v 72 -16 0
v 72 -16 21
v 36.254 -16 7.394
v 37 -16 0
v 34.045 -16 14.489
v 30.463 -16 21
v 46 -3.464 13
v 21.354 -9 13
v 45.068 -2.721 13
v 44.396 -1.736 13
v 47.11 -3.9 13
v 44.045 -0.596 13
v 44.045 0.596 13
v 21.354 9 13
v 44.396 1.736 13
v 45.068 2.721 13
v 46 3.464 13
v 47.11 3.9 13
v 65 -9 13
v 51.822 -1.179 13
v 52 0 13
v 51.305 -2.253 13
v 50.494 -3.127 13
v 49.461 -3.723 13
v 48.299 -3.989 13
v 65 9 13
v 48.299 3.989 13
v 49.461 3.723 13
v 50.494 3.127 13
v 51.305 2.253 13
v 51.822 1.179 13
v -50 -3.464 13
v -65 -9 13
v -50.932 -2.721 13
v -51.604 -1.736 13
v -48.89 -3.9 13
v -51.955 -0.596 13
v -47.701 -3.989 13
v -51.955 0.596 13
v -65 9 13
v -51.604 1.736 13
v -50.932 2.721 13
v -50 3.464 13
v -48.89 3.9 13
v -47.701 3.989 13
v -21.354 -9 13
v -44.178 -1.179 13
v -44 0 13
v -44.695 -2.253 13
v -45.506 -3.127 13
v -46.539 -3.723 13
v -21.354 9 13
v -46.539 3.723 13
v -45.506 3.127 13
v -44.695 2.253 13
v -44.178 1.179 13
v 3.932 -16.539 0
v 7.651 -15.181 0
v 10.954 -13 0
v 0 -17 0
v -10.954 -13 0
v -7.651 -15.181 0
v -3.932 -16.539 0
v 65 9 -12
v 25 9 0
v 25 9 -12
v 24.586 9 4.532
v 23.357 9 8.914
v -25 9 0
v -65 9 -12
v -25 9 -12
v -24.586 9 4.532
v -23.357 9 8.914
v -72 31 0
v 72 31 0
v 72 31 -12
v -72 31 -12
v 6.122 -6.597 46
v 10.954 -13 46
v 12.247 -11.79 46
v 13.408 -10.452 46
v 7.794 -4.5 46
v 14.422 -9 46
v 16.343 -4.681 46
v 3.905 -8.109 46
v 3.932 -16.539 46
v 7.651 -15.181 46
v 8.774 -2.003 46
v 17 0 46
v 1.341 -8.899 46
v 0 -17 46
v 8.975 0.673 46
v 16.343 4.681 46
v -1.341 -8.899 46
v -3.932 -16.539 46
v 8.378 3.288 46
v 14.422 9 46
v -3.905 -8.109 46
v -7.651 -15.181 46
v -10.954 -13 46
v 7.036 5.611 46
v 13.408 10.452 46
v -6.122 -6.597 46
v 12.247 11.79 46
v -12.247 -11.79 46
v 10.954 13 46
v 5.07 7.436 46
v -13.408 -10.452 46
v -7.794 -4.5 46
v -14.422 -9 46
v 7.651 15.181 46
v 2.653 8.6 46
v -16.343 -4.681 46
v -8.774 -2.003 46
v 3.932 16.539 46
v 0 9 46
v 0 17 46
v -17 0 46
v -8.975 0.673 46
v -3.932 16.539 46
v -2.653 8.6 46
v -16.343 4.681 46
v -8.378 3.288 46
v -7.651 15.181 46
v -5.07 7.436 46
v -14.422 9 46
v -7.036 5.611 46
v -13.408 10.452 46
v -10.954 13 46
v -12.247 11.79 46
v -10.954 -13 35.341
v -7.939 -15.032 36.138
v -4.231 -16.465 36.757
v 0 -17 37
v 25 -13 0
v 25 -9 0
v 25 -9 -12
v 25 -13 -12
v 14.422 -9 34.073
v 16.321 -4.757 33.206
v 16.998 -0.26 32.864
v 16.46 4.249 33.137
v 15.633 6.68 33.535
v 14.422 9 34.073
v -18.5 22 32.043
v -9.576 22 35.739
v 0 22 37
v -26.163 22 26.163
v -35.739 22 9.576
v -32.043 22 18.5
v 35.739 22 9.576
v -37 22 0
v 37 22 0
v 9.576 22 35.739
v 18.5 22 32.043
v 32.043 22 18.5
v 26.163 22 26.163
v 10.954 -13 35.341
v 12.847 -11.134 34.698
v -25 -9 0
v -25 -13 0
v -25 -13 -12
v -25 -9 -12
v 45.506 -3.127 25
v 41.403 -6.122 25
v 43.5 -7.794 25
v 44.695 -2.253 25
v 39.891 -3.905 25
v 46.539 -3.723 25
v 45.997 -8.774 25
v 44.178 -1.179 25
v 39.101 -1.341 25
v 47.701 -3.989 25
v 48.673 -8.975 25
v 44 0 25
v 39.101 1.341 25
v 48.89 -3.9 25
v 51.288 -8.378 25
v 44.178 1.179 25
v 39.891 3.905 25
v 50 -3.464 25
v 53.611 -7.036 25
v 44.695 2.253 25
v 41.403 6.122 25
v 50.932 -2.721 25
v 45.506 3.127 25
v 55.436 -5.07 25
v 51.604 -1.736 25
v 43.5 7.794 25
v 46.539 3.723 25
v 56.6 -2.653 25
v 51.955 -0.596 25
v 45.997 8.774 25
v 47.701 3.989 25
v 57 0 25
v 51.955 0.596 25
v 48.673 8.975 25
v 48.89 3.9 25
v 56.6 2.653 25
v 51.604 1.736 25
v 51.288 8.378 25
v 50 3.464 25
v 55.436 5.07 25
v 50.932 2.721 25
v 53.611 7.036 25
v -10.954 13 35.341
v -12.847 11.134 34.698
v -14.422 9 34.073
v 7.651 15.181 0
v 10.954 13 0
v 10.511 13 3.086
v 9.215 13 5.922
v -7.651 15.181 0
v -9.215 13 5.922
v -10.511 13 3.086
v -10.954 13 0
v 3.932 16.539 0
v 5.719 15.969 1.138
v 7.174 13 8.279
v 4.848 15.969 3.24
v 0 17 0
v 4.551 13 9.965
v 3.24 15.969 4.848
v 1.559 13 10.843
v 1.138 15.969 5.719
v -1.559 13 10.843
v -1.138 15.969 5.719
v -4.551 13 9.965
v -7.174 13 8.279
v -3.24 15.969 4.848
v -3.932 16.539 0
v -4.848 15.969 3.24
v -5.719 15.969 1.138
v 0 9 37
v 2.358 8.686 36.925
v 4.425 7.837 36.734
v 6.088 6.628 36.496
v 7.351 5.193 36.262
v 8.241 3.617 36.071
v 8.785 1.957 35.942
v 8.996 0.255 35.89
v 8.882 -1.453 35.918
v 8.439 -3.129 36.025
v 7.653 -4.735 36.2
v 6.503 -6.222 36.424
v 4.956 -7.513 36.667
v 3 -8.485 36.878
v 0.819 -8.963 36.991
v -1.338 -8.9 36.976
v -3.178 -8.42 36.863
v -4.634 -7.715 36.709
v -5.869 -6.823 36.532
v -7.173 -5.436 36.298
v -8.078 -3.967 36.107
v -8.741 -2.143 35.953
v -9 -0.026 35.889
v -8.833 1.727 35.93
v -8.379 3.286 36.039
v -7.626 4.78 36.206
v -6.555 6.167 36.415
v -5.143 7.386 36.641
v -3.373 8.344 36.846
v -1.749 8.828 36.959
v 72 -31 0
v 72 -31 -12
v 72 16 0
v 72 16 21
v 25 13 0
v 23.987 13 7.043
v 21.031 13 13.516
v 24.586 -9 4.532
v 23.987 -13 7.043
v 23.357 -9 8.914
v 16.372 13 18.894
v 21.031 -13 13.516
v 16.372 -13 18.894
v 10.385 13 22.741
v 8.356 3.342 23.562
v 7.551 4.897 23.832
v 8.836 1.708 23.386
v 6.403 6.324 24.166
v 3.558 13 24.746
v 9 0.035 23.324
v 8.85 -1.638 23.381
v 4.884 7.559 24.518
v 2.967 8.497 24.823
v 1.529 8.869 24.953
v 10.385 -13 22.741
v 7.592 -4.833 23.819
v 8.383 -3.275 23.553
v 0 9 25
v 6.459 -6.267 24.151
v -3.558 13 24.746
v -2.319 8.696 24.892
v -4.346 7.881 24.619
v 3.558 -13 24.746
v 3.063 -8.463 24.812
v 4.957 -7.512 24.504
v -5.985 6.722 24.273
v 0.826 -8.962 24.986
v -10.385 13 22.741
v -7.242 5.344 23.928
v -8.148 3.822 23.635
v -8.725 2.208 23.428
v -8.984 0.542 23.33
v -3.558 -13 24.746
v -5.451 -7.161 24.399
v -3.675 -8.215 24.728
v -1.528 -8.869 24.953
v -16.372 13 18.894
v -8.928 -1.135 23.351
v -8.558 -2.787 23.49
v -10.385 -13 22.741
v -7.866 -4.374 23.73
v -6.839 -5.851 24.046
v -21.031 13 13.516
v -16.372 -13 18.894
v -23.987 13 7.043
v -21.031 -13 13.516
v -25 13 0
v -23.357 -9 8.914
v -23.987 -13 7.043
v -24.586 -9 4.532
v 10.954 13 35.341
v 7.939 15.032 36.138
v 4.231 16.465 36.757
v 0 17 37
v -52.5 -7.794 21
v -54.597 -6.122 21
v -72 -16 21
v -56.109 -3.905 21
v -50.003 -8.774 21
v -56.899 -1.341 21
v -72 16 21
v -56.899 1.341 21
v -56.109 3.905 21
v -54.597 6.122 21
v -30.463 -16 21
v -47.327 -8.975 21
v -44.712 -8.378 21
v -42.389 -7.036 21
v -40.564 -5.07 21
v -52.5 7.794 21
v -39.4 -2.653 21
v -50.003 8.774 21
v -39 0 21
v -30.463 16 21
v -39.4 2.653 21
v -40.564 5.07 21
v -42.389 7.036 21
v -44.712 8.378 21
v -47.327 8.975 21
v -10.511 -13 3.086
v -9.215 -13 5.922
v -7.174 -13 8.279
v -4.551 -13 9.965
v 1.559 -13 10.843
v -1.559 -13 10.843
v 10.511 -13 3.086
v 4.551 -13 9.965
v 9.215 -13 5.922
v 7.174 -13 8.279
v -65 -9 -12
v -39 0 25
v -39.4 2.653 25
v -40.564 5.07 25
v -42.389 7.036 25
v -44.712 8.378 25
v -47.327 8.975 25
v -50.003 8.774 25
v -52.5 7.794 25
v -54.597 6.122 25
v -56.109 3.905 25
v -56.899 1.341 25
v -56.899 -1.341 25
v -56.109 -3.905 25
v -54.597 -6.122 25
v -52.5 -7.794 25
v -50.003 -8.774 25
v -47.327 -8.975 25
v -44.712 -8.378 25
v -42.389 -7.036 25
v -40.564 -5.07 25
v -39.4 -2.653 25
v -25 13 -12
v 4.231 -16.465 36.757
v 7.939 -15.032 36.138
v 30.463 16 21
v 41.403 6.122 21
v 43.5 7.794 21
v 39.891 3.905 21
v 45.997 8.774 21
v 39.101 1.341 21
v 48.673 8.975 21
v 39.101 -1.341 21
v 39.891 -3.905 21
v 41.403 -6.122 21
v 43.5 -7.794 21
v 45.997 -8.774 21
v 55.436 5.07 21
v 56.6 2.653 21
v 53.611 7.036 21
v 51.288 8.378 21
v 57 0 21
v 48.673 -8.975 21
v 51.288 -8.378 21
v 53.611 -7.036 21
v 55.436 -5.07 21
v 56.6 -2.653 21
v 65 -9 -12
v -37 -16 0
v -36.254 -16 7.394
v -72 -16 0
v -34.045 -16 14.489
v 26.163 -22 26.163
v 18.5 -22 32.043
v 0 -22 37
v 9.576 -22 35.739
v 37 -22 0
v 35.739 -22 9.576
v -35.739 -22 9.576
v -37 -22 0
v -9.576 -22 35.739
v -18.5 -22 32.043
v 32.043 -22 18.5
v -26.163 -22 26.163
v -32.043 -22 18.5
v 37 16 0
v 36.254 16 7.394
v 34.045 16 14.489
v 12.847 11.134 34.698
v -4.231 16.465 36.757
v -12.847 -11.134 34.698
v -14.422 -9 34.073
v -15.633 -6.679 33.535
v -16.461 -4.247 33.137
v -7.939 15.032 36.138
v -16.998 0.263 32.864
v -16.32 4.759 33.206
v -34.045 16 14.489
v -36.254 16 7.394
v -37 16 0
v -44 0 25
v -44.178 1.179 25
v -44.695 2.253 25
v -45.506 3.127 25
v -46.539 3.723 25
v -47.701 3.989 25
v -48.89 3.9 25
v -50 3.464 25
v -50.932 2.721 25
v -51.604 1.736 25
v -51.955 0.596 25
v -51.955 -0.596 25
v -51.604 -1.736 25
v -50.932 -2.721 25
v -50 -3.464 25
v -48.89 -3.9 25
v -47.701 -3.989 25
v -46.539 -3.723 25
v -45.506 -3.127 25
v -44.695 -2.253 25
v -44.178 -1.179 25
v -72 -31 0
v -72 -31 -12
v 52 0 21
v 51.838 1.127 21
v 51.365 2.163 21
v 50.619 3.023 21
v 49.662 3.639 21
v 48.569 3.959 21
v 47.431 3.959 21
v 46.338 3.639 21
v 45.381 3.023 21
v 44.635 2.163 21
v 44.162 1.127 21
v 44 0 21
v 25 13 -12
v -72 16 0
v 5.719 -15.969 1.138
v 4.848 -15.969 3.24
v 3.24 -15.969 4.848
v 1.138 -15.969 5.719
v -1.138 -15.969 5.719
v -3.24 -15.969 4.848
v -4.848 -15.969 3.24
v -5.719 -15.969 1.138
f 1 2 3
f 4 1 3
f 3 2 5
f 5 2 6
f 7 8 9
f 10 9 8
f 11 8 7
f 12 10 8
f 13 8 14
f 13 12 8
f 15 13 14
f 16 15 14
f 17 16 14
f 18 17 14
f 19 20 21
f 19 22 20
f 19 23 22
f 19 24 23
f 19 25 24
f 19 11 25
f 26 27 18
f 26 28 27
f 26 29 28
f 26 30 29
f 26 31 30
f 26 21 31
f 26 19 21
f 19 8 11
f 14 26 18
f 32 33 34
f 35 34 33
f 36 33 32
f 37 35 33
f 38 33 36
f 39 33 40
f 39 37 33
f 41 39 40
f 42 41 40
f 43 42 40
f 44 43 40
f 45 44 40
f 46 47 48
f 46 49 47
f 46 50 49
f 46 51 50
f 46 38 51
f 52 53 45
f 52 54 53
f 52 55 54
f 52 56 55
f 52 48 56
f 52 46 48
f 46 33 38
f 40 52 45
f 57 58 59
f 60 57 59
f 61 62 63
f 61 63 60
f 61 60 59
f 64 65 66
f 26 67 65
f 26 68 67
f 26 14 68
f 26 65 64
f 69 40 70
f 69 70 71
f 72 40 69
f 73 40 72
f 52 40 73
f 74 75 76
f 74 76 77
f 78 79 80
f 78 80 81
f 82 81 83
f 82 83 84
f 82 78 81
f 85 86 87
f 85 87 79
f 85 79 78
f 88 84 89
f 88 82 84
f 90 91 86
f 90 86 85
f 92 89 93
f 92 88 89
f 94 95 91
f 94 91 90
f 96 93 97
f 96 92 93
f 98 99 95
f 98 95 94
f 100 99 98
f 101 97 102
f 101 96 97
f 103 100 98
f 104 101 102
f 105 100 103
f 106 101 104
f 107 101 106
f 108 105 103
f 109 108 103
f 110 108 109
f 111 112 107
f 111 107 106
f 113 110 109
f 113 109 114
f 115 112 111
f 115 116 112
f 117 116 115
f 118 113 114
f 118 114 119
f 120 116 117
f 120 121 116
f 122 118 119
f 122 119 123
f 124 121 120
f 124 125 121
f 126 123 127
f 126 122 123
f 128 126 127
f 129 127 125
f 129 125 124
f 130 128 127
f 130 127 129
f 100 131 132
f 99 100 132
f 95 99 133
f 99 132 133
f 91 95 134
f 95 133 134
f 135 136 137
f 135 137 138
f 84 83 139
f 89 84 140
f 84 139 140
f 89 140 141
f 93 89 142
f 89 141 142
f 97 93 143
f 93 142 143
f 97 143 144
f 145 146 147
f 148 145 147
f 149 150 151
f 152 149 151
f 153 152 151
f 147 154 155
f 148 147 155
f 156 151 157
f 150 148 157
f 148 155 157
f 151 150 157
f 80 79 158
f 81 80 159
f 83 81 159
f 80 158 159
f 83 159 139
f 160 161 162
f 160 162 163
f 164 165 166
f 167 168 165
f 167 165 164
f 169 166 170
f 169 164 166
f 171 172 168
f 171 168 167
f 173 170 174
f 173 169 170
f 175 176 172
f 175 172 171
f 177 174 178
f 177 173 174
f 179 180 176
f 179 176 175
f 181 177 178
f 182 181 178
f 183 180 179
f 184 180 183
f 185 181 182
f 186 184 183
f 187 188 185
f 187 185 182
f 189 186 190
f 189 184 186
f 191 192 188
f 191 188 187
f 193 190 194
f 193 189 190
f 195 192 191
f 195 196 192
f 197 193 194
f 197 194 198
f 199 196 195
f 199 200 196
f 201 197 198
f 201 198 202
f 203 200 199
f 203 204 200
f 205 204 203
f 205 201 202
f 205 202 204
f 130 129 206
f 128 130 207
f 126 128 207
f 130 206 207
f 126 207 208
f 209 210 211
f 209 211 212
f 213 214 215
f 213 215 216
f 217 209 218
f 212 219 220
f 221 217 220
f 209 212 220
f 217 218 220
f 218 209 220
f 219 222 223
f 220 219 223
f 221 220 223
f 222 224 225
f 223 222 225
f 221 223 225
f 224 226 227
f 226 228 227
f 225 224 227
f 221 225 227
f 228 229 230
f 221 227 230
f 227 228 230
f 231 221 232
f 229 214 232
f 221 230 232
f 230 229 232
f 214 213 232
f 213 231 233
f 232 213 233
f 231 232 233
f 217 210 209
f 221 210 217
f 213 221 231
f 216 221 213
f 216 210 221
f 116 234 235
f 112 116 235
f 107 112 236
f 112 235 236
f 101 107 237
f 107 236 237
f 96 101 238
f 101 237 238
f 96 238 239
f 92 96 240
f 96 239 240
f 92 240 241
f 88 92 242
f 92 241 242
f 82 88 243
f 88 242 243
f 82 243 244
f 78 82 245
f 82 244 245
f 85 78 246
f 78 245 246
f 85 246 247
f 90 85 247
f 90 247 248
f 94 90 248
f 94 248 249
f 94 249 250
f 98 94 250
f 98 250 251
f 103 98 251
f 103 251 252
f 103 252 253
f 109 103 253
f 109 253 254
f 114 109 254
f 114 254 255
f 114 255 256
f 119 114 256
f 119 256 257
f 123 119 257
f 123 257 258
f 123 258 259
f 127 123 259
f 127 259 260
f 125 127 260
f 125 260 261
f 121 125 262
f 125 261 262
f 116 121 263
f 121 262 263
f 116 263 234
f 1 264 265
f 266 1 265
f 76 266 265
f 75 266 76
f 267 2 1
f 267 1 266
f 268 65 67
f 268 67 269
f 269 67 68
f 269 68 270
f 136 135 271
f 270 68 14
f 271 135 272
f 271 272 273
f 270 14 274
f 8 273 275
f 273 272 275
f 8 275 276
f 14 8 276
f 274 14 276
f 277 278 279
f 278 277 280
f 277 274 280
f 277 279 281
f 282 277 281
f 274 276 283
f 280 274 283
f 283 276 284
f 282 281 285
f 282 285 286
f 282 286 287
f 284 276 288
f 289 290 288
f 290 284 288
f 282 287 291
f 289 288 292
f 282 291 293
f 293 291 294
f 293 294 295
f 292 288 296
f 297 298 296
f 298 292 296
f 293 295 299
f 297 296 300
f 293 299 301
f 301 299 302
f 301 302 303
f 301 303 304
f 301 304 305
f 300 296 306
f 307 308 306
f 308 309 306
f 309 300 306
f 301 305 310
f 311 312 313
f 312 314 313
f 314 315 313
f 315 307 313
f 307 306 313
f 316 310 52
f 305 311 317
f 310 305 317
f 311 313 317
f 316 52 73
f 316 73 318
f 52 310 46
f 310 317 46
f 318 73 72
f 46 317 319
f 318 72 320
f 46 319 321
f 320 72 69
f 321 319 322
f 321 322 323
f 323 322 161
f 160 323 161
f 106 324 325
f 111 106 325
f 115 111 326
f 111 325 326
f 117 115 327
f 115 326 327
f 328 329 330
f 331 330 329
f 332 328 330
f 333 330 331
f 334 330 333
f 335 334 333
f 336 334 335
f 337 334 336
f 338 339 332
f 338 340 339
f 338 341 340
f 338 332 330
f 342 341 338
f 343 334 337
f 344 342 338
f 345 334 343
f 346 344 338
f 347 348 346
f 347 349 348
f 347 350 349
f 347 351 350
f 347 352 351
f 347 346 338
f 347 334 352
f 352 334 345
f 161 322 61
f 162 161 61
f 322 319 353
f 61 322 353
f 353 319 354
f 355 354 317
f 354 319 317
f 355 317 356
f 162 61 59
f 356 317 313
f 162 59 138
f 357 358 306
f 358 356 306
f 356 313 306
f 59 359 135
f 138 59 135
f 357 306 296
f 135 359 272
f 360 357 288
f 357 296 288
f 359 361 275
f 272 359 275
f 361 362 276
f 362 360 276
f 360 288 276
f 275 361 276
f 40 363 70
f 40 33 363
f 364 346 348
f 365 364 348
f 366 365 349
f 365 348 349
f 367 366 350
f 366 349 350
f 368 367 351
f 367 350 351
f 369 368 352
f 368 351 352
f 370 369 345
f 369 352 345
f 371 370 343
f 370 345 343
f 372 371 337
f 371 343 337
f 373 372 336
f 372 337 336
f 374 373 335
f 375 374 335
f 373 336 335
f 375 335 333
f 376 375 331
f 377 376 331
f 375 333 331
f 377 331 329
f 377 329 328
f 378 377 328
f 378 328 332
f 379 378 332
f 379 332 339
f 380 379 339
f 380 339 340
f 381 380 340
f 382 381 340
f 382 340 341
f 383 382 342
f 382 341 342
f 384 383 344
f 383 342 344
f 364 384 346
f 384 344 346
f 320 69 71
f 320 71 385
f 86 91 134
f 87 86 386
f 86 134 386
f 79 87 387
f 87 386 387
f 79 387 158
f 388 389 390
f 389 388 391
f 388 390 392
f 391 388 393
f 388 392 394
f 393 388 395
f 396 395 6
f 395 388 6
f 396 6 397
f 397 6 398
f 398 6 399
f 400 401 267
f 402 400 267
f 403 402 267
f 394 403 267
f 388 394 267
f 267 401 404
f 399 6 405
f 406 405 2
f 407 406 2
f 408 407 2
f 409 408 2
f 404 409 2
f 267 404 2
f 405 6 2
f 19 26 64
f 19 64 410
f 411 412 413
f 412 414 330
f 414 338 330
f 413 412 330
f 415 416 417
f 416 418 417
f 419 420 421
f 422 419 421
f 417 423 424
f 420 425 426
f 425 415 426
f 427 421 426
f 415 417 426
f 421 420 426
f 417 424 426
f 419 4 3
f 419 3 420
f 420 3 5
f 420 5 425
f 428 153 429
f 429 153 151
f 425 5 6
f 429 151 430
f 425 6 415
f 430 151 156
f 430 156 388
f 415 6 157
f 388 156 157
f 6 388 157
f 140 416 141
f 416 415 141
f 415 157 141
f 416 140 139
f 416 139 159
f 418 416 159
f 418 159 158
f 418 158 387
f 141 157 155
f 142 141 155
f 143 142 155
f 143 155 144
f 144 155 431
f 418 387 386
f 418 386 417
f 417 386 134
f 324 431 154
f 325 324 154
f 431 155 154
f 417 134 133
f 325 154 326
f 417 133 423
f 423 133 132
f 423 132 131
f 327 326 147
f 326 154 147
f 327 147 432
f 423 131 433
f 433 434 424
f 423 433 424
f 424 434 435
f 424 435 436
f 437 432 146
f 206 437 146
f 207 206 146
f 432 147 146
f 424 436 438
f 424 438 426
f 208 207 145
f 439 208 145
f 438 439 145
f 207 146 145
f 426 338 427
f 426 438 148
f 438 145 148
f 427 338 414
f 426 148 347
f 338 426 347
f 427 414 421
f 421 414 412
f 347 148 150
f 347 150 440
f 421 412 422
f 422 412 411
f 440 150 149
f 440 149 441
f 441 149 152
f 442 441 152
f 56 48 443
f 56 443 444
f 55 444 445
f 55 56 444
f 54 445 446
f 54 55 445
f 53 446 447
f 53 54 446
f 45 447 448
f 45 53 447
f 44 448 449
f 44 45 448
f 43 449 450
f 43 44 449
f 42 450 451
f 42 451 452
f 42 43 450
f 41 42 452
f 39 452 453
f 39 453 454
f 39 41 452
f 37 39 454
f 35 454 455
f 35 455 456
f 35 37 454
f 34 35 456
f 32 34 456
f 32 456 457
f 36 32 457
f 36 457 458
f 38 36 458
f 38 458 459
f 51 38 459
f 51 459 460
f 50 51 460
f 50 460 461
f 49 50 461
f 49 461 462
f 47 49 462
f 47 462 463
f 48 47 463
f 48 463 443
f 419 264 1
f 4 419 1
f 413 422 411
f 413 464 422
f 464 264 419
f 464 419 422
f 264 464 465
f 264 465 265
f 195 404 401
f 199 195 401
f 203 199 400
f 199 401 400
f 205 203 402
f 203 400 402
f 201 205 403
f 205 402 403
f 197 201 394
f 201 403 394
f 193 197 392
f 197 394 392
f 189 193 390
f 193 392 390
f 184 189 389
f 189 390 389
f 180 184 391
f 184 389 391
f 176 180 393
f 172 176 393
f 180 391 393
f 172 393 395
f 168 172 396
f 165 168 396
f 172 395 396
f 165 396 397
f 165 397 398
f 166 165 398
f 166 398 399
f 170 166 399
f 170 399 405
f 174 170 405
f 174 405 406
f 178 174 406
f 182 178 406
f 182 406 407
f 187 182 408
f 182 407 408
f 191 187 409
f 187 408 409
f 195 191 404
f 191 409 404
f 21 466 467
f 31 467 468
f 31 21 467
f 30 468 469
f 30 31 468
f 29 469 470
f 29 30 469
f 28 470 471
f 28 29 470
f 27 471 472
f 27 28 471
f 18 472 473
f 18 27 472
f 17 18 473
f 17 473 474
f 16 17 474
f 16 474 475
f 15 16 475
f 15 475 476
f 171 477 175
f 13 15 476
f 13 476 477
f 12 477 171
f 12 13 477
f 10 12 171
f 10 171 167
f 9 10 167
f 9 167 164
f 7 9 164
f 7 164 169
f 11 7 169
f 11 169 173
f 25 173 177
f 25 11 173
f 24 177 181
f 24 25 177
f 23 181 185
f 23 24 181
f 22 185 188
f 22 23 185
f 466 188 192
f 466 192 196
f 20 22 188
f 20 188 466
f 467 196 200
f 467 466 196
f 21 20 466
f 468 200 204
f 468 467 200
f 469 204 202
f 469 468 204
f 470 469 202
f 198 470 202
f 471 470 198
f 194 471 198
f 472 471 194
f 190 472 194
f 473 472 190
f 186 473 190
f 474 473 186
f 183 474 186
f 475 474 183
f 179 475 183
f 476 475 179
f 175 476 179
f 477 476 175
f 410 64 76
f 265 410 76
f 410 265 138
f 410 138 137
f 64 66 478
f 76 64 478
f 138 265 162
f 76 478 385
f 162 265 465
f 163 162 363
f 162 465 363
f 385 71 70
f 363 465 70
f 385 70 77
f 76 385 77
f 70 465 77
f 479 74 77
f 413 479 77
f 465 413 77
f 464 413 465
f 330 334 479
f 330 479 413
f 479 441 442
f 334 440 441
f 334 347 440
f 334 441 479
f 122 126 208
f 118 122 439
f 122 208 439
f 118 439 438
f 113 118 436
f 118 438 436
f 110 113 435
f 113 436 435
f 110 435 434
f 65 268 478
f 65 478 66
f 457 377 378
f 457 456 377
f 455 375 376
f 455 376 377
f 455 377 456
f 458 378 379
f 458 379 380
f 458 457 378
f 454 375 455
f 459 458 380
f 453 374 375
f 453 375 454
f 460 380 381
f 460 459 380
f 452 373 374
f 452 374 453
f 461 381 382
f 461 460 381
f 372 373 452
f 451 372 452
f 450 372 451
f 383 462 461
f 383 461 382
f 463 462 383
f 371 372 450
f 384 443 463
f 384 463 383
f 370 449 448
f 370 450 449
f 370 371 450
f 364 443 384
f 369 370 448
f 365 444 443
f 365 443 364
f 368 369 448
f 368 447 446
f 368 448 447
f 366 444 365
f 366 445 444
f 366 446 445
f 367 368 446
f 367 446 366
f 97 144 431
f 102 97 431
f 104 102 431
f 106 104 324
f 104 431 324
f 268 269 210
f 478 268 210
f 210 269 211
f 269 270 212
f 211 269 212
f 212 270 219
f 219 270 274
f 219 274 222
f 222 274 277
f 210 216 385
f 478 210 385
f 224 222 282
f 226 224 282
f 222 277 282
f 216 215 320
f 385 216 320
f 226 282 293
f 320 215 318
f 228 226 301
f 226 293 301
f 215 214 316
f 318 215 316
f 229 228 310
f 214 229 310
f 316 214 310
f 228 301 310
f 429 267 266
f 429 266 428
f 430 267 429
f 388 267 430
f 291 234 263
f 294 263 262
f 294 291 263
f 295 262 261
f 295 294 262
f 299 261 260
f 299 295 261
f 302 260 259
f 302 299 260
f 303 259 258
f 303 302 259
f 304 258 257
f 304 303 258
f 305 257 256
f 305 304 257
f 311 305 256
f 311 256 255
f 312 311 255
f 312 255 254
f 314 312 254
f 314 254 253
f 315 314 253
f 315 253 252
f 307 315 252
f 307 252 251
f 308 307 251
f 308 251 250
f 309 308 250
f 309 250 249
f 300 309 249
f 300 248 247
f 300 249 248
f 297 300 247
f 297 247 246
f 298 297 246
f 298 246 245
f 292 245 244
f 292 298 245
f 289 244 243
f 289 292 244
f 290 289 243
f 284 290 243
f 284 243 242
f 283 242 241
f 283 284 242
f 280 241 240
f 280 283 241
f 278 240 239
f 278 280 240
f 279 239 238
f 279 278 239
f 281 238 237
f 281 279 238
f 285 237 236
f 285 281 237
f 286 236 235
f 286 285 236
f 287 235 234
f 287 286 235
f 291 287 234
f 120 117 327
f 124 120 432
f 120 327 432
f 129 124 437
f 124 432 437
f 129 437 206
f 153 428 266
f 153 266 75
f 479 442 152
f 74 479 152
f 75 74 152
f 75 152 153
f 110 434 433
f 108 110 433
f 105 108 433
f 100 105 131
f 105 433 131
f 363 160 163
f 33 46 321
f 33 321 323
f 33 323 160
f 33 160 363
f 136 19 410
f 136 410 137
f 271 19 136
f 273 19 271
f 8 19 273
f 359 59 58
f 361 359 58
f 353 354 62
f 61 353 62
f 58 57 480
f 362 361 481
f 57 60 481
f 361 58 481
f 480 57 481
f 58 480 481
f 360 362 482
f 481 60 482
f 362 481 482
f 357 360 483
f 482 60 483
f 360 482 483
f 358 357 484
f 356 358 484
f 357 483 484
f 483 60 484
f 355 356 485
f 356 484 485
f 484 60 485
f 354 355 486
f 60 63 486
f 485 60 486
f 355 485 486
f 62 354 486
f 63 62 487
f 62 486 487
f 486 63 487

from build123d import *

# Parameters (mm, degrees)
SKETCH1_W               = 62
SKETCH1_H               = 144
BOSS_EXTRUDE1_DEPTH     = 12
REVOLVE1_ANGLE          = 180
BOSS_EXTRUDE2_START     = 25
SKETCH1_4_R             = 17
SKETCH1_4_R_2           = 9
BOSS_EXTRUDE2_DEPTH     = 21
SKETCH2_W               = 41.536907577
SKETCH2_H               = 21
BOSS_EXTRUDE3_DEPTH     = 16
SKETCH3_W               = 18
SKETCH3_H               = 13
CUT_EXTRUDE2_DEPTH      = 65
BOSS_EXTRUDE4_START     = 21
SKETCH1_5_R             = 9
SKETCH1_5_R_2           = 4
BOSS_EXTRUDE4_DEPTH     = 4
CUT_EXTRUDE3_DEPTH      = 91.89004351
CUT_EXTRUDE3_DEPTH_BACK = 91.89004351
SKETCH1_6_R             = 9
SKETCH1_6_R_2           = 4


with BuildPart() as part:
    # Sketch1 → Boss-Extrude1 (new body)
    with BuildSketch(Plane(origin=(0, 0, 0), x_dir=(0, 1, 0), z_dir=(0, 0, 1))):
        Rectangle(SKETCH1_W, SKETCH1_H)
        Polygon((13, -25), (9, -25), (9, -65), (-9, -65), (-9, -25), (-13, -25), (-13, 25), (-9, 25), (-9, 65), (9, 65), (9, 25), (13, 25), align=None, mode=Mode.SUBTRACT)
    extrude(amount=-BOSS_EXTRUDE1_DEPTH)

    # Sketch1<3> → Revolve1 (revolve)
    with BuildSketch(Plane(origin=(0, 0, 0), x_dir=(0, 1, 0), z_dir=(0, 0, 1))):
        with BuildLine():
            Line((-22, 0), (-22, -37))
            Line((-22, -37), (22, -37))
            Line((22, -37), (22, 0))
            Line((22, 0), (17, 0))
            ThreePointArc((17, 0), (15.968719423, -5.830951895), (13, -10.95445115))
            Line((13, -10.95445115), (13, -25))
            Line((13, -25), (-13, -25))
            Line((-13, -25), (-13, -10.95445115))
            ThreePointArc((-13, -10.95445115), (-15.968719423, -5.830951895), (-17, 0))
            Line((-17, 0), (-22, 0))
        make_face()
    revolve(axis=Axis((0, -69.170626614, 0), (0, -1, 0)), revolution_arc=REVOLVE1_ANGLE)

    # Sketch1<4> → Boss-Extrude2 (add)
    with BuildSketch(Plane(origin=(0, 0, 0), x_dir=(0, 1, 0), z_dir=(0, 0, 1)).offset(BOSS_EXTRUDE2_START)):
        Circle(SKETCH1_4_R)
        Circle(SKETCH1_4_R_2, mode=Mode.SUBTRACT)
    extrude(amount=BOSS_EXTRUDE2_DEPTH)

    # Sketch2 → Boss-Extrude3 (add, symmetric)
    with BuildSketch(Plane(origin=(0, 0, 0), x_dir=(-1, 0, 0), z_dir=(0, 1, 0))):
        with Locations((-51.231546212, 10.5)):
            Rectangle(SKETCH2_W, SKETCH2_H)
        with Locations((51.231546212, 10.5)):
            Rectangle(SKETCH2_W, SKETCH2_H)
    extrude(amount=BOSS_EXTRUDE3_DEPTH, both=True)

    # Sketch3 → Cut-Extrude2 (cut, symmetric)
    with BuildSketch(Plane.YZ):
        with Locations((0, 6.5)):
            Rectangle(SKETCH3_W, SKETCH3_H)
    extrude(amount=CUT_EXTRUDE2_DEPTH, both=True, mode=Mode.SUBTRACT)

    # Sketch1<5> → Boss-Extrude4 (add)
    # profile 1 of 2: a face of its own
    with BuildSketch(Plane(origin=(0, 0, 0), x_dir=(0, 1, 0), z_dir=(0, 0, 1)).offset(BOSS_EXTRUDE4_START)):
        with Locations((0, -48)):
            Circle(SKETCH1_5_R)
        with Locations((0, -48)):
            Circle(SKETCH1_5_R_2, mode=Mode.SUBTRACT)
    # profile 2 of 2: a face of its own
    with BuildSketch(Plane(origin=(0, 0, 0), x_dir=(0, 1, 0), z_dir=(0, 0, 1)).offset(BOSS_EXTRUDE4_START)):
        with Locations((0, 48)):
            Circle(SKETCH1_5_R)
        with Locations((0, 48)):
            Circle(SKETCH1_5_R_2, mode=Mode.SUBTRACT)
    extrude(amount=BOSS_EXTRUDE4_DEPTH)

    # Sketch1<6> → Cut-Extrude3 (cut, two sides: drawn at the far end of the back side and taken through both)
    with BuildSketch(Plane(origin=(0, 0, 0), x_dir=(0, 1, 0), z_dir=(0, 0, 1)).offset(-CUT_EXTRUDE3_DEPTH_BACK)):
        Circle(SKETCH1_6_R)
        with Locations((0, 48)):
            Circle(SKETCH1_6_R_2)
        with Locations((0, -48)):
            Circle(SKETCH1_6_R_2)
    extrude(amount=CUT_EXTRUDE3_DEPTH + CUT_EXTRUDE3_DEPTH_BACK, mode=Mode.SUBTRACT)


solid = part.part
